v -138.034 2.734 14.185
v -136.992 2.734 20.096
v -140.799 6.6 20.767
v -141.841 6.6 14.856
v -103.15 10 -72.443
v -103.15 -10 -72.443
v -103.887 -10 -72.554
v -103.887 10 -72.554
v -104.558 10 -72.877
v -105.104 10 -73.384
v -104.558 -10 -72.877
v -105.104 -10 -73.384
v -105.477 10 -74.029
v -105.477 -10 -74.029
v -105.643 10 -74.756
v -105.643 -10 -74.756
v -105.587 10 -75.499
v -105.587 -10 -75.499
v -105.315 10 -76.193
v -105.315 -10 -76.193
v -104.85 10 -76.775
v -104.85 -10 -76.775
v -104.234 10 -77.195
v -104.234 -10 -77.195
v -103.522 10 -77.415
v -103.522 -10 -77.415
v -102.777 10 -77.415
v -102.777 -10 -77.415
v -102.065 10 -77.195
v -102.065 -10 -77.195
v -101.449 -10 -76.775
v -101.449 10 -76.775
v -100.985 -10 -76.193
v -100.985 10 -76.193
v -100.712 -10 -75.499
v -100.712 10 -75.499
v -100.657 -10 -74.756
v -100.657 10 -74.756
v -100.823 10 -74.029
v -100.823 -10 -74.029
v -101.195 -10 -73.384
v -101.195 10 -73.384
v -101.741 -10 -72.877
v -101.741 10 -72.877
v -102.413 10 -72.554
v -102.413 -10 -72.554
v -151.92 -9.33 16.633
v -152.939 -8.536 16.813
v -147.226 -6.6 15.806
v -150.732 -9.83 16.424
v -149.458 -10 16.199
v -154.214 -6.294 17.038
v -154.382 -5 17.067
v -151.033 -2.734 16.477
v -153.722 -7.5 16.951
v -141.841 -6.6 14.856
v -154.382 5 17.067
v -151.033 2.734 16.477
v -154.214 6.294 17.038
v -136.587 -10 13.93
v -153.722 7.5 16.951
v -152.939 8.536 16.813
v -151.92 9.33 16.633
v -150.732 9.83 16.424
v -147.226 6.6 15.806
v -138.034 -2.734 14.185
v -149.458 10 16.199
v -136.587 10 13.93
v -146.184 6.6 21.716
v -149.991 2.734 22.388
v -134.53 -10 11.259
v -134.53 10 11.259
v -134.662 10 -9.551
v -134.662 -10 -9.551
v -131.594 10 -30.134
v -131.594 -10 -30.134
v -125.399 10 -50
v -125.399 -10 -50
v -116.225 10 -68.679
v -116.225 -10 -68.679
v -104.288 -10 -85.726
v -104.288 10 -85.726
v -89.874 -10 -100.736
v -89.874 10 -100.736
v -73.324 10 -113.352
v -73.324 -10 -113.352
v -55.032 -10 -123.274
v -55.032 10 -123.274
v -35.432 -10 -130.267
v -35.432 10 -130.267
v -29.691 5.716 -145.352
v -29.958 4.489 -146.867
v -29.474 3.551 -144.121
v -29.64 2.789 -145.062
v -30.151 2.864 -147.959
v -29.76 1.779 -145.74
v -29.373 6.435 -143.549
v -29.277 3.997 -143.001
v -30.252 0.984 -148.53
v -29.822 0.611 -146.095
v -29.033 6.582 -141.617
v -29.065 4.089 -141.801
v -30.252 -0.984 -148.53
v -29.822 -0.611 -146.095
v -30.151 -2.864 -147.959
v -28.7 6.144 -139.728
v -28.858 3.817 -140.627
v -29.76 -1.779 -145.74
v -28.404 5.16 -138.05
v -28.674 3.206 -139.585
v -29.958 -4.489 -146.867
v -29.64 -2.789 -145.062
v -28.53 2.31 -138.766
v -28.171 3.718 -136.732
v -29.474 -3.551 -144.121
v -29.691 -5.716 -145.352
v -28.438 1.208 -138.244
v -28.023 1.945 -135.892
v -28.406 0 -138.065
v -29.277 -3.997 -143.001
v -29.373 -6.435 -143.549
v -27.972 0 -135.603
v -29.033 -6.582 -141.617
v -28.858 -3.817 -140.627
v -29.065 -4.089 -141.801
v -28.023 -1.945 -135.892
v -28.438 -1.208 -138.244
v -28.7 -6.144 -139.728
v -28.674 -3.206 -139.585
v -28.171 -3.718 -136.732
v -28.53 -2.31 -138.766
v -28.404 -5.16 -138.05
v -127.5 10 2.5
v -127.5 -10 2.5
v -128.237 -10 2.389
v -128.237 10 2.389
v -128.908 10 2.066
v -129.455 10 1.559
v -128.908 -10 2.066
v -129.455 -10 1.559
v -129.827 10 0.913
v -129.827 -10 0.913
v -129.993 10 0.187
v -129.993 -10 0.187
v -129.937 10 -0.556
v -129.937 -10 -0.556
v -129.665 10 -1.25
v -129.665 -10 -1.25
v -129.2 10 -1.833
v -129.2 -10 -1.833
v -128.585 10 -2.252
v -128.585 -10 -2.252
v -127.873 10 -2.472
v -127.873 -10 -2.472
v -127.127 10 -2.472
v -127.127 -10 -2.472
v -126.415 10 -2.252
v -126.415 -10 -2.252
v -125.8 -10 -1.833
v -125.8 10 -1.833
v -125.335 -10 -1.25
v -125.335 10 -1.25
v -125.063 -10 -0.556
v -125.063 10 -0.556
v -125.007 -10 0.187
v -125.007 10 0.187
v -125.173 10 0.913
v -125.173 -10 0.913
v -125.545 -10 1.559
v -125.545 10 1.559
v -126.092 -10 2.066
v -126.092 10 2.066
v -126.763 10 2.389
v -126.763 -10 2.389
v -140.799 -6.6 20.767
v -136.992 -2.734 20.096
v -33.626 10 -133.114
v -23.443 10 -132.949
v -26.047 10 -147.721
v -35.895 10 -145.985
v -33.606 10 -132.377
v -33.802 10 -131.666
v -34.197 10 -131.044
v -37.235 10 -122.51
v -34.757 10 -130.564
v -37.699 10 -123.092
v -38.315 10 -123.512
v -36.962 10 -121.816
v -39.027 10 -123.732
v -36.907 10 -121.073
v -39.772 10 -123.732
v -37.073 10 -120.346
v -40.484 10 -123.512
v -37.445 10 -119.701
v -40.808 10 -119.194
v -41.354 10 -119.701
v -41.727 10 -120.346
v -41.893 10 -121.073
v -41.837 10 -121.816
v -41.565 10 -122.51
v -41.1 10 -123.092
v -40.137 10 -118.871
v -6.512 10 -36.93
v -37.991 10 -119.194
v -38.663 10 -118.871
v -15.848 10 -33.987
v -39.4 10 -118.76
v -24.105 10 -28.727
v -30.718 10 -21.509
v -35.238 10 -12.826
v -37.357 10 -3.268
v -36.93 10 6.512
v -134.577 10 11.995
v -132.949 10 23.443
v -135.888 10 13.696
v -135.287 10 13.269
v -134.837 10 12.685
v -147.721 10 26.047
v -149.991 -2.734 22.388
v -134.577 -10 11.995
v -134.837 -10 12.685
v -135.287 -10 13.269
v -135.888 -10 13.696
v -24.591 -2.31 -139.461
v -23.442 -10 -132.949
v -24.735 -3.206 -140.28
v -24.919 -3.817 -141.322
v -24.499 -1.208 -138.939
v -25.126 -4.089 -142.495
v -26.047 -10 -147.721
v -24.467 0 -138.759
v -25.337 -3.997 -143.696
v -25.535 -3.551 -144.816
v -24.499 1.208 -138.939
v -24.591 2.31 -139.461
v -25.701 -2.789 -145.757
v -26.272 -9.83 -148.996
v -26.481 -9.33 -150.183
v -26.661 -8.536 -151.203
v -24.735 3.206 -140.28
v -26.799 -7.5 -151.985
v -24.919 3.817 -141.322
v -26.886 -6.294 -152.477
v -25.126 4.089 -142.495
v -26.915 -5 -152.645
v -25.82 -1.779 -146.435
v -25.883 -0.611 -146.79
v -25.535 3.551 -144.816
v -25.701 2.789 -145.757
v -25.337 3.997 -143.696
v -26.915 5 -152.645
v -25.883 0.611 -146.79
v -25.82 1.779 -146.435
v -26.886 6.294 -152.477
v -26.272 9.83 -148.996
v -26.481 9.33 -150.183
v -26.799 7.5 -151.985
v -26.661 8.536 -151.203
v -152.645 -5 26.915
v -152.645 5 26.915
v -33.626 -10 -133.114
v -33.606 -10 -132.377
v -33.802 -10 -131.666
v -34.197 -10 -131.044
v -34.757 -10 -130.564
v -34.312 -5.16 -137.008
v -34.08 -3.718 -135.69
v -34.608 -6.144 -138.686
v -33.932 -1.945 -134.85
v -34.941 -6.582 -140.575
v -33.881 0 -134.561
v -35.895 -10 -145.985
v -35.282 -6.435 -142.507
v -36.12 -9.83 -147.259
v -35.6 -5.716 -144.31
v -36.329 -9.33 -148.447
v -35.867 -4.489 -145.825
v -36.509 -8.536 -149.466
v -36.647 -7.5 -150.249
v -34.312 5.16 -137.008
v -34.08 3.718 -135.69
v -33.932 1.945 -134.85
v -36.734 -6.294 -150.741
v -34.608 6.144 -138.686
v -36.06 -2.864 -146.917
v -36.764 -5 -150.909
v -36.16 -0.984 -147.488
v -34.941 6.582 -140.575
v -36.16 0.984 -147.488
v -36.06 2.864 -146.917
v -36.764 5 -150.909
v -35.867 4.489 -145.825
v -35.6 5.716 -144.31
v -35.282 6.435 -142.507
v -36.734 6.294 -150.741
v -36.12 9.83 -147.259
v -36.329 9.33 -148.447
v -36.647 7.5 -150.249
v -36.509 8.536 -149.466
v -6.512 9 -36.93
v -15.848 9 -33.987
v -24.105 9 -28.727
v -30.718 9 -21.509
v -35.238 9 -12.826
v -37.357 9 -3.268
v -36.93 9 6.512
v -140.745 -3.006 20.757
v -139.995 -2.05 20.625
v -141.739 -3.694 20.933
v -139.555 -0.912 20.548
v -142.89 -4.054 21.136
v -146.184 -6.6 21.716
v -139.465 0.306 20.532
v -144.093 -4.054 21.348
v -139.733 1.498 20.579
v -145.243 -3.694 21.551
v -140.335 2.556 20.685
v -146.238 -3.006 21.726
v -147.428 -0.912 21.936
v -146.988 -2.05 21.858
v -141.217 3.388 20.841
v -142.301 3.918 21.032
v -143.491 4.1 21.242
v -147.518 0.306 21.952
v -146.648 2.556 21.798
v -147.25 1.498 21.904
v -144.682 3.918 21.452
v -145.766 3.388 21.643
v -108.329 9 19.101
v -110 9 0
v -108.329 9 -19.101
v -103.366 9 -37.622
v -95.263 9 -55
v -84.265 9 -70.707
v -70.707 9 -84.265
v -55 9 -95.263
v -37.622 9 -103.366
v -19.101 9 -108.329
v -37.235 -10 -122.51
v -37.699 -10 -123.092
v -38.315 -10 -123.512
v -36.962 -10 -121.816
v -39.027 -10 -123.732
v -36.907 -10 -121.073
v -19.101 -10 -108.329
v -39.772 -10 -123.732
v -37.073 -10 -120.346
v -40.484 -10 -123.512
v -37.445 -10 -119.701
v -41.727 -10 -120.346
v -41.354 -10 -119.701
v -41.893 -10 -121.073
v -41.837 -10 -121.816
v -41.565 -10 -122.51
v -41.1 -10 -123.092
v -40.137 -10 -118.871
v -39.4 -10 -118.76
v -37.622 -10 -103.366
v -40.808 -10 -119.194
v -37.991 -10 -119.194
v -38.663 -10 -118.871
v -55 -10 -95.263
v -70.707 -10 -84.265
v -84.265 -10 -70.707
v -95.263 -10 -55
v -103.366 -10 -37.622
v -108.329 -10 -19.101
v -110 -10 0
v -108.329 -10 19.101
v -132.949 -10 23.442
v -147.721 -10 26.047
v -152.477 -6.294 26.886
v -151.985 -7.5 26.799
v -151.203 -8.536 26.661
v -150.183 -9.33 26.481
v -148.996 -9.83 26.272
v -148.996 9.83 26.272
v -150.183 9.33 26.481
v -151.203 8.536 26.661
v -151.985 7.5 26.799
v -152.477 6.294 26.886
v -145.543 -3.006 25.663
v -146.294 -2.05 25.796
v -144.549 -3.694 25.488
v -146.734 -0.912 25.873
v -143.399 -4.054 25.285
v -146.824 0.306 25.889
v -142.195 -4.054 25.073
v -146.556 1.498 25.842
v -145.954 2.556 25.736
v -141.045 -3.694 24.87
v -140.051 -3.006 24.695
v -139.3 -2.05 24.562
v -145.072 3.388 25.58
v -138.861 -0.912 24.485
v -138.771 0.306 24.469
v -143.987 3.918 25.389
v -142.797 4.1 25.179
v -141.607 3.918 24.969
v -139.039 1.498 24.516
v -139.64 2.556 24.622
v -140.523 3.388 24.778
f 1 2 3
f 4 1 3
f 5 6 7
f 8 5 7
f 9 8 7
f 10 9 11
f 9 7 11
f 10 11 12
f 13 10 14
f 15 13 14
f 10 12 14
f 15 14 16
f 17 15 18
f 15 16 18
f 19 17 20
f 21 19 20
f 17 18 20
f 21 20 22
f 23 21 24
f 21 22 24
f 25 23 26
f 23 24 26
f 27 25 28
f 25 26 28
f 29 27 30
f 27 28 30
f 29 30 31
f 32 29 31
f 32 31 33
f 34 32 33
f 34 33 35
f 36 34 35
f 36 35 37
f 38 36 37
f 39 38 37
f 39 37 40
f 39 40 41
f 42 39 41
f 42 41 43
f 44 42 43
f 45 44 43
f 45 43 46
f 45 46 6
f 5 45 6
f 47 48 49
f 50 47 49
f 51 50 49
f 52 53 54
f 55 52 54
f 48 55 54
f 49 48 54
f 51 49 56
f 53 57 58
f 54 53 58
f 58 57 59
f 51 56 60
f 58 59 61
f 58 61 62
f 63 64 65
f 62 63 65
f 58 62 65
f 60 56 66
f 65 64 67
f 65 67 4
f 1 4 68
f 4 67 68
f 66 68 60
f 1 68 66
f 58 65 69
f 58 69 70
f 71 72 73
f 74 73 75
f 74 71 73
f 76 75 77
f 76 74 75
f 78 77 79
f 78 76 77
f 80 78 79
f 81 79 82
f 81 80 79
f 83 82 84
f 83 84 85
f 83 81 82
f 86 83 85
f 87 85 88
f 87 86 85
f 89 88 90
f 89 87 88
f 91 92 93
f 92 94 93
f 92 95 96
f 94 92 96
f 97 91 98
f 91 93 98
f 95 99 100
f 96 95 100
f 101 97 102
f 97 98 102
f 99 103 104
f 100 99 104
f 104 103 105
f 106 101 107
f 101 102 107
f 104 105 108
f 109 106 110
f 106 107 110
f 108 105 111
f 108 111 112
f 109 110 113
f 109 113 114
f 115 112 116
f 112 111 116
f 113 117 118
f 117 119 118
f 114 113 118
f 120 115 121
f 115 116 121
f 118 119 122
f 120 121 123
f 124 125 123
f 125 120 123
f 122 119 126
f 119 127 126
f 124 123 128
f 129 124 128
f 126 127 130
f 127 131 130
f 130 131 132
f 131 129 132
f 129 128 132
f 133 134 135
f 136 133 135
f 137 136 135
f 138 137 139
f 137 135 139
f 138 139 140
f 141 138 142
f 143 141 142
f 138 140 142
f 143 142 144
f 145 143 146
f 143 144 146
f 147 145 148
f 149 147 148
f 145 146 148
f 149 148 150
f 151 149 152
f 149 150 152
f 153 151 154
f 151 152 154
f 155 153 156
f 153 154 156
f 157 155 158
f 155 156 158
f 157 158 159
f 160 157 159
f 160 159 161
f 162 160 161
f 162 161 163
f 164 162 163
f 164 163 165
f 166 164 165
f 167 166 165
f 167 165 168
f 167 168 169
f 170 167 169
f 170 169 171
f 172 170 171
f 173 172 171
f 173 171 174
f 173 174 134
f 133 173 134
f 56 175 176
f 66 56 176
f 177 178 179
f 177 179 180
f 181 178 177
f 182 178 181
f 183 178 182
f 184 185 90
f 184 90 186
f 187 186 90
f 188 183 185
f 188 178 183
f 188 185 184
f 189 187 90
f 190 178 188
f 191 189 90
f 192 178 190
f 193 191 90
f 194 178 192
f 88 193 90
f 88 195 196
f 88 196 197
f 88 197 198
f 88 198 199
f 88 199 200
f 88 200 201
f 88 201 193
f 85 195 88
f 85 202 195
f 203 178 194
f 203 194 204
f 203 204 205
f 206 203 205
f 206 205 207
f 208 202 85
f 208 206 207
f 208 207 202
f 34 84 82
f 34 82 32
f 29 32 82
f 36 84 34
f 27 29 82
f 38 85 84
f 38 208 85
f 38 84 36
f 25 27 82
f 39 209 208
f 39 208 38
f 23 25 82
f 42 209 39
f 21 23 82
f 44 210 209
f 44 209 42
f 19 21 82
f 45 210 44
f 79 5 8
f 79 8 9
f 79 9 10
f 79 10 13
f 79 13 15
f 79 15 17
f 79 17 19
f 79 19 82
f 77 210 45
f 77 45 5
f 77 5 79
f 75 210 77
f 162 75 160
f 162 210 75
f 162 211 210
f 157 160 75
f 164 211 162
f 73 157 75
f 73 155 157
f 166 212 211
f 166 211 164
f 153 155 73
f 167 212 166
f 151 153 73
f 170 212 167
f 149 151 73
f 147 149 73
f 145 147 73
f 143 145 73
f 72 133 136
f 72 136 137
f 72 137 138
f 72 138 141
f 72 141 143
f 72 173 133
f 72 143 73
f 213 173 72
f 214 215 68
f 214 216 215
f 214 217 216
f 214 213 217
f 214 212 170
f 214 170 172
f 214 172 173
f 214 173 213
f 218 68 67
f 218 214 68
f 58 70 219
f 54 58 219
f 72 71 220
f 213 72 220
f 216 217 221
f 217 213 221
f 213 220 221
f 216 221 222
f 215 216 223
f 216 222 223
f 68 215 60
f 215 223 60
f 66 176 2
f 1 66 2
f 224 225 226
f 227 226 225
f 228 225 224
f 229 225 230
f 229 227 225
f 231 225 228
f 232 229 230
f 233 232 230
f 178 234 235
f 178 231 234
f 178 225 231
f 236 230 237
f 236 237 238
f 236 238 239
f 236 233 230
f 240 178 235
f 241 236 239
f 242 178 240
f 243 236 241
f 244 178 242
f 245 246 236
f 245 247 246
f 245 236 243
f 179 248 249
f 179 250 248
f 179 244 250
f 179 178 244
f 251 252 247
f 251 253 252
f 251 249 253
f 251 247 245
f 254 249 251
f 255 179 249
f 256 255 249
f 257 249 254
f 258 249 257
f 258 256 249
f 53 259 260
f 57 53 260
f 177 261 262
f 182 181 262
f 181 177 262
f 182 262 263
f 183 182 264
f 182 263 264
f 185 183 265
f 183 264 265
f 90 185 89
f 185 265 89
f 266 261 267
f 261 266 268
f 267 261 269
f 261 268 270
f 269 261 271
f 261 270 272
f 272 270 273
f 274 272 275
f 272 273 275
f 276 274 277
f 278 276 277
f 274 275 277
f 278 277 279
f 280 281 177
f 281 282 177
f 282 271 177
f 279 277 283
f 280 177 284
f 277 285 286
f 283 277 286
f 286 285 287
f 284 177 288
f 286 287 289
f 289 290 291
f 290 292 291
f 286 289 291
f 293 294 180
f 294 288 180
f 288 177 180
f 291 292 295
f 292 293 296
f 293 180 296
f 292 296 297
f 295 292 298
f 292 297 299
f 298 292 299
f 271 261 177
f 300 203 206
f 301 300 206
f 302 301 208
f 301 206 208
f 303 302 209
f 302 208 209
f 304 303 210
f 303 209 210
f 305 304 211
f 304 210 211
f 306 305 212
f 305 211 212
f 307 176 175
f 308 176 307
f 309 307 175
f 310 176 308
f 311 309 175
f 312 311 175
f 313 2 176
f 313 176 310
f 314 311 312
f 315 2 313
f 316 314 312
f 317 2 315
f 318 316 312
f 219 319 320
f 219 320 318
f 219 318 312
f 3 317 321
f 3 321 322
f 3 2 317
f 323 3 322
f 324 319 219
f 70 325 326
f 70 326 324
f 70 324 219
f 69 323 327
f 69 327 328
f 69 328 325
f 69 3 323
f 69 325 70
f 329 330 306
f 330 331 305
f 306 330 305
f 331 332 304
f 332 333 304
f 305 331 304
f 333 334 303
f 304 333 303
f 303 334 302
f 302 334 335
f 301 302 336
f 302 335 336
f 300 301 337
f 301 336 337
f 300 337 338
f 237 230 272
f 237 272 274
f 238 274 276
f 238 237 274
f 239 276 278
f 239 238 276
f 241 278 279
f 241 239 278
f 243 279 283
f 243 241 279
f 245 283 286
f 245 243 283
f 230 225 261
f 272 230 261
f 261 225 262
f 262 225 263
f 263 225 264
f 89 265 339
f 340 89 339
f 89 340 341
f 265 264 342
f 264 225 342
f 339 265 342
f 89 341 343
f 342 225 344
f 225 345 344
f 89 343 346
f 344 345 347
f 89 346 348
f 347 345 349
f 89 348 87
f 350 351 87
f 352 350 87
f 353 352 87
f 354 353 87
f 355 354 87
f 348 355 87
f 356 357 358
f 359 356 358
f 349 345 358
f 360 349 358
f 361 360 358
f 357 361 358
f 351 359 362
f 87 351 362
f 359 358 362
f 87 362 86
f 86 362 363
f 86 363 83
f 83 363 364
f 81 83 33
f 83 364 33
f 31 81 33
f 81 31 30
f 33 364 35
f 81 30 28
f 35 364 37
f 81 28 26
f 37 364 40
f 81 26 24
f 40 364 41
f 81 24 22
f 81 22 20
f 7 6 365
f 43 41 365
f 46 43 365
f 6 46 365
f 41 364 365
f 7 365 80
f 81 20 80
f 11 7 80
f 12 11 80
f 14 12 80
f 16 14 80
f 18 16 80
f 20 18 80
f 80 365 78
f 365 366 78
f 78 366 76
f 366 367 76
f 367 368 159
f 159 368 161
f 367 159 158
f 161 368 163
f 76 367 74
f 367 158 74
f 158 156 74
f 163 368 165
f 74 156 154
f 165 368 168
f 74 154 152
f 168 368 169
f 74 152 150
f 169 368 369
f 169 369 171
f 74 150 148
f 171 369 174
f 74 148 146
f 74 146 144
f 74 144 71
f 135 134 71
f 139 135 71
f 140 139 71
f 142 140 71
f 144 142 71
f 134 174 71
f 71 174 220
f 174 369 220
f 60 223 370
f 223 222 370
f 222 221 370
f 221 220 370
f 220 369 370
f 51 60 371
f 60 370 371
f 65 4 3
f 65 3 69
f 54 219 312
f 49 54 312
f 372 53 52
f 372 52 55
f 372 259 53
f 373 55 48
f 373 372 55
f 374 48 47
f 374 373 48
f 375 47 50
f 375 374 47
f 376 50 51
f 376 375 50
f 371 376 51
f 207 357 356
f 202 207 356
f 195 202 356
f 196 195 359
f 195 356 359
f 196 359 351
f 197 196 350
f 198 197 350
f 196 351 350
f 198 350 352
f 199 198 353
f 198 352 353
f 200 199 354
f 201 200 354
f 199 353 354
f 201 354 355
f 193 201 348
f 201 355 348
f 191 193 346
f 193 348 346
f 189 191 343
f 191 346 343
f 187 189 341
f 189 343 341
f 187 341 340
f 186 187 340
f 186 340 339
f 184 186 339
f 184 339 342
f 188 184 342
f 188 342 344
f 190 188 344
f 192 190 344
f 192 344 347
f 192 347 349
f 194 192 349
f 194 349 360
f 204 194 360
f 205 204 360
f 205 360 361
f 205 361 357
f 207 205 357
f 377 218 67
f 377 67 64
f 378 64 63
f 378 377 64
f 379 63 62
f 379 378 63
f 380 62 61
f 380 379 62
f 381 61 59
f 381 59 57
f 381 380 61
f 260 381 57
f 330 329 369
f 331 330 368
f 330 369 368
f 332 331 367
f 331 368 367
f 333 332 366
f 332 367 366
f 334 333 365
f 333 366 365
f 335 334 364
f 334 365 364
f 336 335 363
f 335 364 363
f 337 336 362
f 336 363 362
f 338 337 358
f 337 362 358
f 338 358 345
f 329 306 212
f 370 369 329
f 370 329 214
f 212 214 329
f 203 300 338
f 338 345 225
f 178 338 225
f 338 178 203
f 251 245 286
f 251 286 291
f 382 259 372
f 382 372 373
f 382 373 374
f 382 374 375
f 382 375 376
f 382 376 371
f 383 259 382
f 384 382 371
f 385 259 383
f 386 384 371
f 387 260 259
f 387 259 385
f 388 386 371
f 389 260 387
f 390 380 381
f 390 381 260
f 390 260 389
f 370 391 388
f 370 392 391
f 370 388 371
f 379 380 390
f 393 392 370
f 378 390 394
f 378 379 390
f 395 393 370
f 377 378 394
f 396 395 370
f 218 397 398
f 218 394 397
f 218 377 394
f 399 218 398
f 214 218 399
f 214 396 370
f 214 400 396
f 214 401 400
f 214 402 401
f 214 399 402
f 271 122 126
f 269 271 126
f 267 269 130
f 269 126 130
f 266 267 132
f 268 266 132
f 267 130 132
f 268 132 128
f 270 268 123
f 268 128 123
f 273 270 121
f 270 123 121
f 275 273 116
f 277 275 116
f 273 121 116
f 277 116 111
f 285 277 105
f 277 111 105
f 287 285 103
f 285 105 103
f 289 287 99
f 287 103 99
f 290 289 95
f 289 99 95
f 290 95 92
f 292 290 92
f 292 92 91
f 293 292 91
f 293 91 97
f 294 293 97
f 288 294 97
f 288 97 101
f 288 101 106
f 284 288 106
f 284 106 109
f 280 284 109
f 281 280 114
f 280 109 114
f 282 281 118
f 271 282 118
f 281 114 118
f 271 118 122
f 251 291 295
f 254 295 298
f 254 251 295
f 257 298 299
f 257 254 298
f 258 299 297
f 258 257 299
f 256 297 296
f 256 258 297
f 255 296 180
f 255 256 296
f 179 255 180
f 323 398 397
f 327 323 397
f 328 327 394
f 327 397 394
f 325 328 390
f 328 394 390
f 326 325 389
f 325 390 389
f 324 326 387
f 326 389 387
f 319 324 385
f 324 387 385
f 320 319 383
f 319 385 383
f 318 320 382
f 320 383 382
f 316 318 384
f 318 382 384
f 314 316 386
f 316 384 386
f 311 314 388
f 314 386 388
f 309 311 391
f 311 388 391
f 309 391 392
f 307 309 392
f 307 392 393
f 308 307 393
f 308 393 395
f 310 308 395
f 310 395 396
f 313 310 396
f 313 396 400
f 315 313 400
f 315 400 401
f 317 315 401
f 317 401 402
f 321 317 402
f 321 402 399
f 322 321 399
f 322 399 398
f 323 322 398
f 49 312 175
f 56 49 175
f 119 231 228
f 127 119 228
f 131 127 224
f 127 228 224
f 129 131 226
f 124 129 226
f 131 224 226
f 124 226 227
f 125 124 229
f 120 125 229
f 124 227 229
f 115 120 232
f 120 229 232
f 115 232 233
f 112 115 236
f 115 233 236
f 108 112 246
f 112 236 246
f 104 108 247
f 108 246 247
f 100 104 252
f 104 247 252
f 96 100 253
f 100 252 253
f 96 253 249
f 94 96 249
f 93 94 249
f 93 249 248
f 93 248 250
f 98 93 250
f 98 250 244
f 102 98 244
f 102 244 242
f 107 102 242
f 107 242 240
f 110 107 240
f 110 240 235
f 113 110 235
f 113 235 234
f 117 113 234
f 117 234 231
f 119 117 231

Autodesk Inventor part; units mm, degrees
ref_plane "YZ Plane" through (0, 0, 0) normal (1, 0, 0) x (0, 1, 0)
ref_plane "XZ Plane" through (0, 0, 0) normal (0, 1, 0) x (-1, 0, 0)
ref_plane "XY Plane" through (0, 0, 0) normal (0, 0, 1) x (1, 0, 0)
sketch "Sketch1" plane through (0, 0, 0) normal (0, 1, 0) x (-1, 0, 0)
  circle A0 centre (0, 0) radius 135
  circle A1 centre (0, 0) radius 110
  dimension "d0" = 270
  dimension "d1" = 220
extrude "Extrusion1" add sketch "Sketch1" along normal mid plane 20
sketch "Sketch2" plane through (0, 10, 0) normal (0, 1, 0) x (1, 0, 0)
  circle A0 centre (0, 0) radius 37.5
  circle A1 centre (0, 0) radius 135
  dimension "d4" = 75
  dimension "d20" = 270
extrude "Extrusion2" add sketch "Sketch2" against normal blind 1
sketch "Sketch3" plane through (0, 10, 0) normal (0, 1, 0) x (1, 0, 0)
  circle A0 centre (0, 0) radius 127.5
  circle A1 centre (127.5, 0) radius 2.5
  circle A2 centre (103.1497, 74.9426) radius 2.5
  circle A3 centre (39.3997, 121.2597) radius 2.5
  circle A4 centre (-39.3997, 121.2597) radius 2.5
  circle A5 centre (-103.1497, 74.9426) radius 2.5
  circle A6 centre (-127.5, 0) radius 2.5
  circle A7 centre (-103.1497, -74.9426) radius 2.5
  circle A8 centre (-39.3997, -121.2597) radius 2.5
  circle A9 centre (39.3997, -121.2597) radius 2.5
  circle A10 centre (103.1497, -74.9426) radius 2.5
  dimension "d7" = 255
  dimension "d8" = 5
  dimension "d11" = 360
hole "Hole1" at (127.5, 10, 0) at (103.1497, 10, 74.9426) at (39.3997, 10, 121.2597) at (-39.3997, 10, 121.2597) at (-103.1497, 10, 74.9426) at (-127.5, 10, 0) at (-103.1497, 10, -74.9426) at (-39.3997, 10, -121.2597) at (39.3997, 10, -121.2597) at (103.1497, 10, -74.9426) direction (0, -1, 0) diameter 5 end through all
sketch "Sketch4" plane through (0, -10, 0) normal (0, -1, 0) x (1, 0, 0)
  circle A0 centre (0, 0) radius 135
  line L0 (0, 0) -> (132.949, -23.4425)
  line L1 (0, 0) -> (135, 0) construction
  line L2 (0, 0) -> (-23.4425, -132.949)
  circle A1 centre (0, 0) radius 135 projected
  line L3 (0, 0) -> (135, 0) construction
  line L4 (0, 0) -> (-132.949, 23.4425)
  dimension "d21" = 135
  dimension "d22" = 10
  dimension "d23" = 100
extrude "Extrusion3" cut sketch "Sketch4" against normal through all contours A0 L0 L4 | A0 L2 L0
sketch "Sketch5" plane through (-23.4425, -10, -132.949) normal (0.9848, 0, -0.1736) x (-0.1736, 0, -0.9848)
  line L0 (0, 0) -> (-25, 0) projected
  line L1 (-2.5, 0) -> (15, 0)
  line L2 (20, 5) -> (20, 15)
  line L3 (15, 20) -> (-2.5, 20)
  line L4 (-2.5, 20) -> (-2.5, 0)
  line L5 (0, 20) -> (0, 0) projected
  arc A0 (20, 15) -> (15, 20) centre (15, 15) ccw
  arc A1 (15, 0) -> (20, 5) centre (15, 5) ccw
  point P0 (-135, 10)
  point P1 (20, 20)
  point P2 (20, 0)
  point P3 (0, 0)
  dimension "d26" = 22.5
  dimension "d27" = 20
  dimension "d28" = 20
  dimension "d29" = 5
extrude "Extrusion4" add sketch "Sketch5" against normal blind 10
fillet "Fillet1" radius 2.5 1 edges at (-33.2262, 0, -130.8473)
sketch "Sketch6" plane through (-132.949, -10, 23.4425) normal (0.1736, 0, 0.9848) x (0.9848, 0, -0.1736)
  line L0 (25, 0) -> (0, 0) projected
  line L1 (2.5, 0) -> (-15, 0)
  line L2 (-20, 5) -> (-20, 15)
  line L3 (-15, 20) -> (2.5, 20)
  line L4 (2.5, 20) -> (2.5, 0)
  line L5 (0, 0) -> (0, 20) projected
  arc A0 (-15, 20) -> (-20, 15) centre (-15, 15) ccw
  arc A1 (-20, 5) -> (-15, 0) centre (-15, 5) ccw
  point P0 (135, 10)
  point P1 (-20, 20)
  point P2 (-20, 0)
  point P3 (0, 0)
  dimension "d33" = 22.5
  dimension "d34" = 20
  dimension "d35" = 20
  dimension "d36" = 5
extrude "Extrusion5" add sketch "Sketch6" against normal blind 10
fillet "Fillet2" radius 2.5 1 edges at (-134.3203, 0, 13.53)
sketch "Sketch7" plane through (-33.2906, -10, -131.2126) normal (-0.9848, 0, 0.1736) x (0.1736, 0, 0.9848)
  line L0 (-1.9306, 20) -> (-15, 20) projected
  line L1 (-20, 15) -> (-20, 5) projected
  point P0 (135, 10)
  point P1 (-10, 10)
  dimension "d40" = 10
  dimension "d41" = 10
hole "Hole2" at (-35.0271, 0, -141.0606) direction (0.9848, 0, -0.1736) diameter 8.2 end through all counterbore diameter 13.2 counterbore depth 6
sketch "Sketch8" plane through (-134.6855, -10, 13.5944) normal (-0.1736, 0, -0.9848) x (-0.9848, 0, 0.1736)
  line L0 (12.7338, 3.4) -> (7.2662, 3.4)
  line L1 (7.2662, 3.4) -> (3.4, 7.2662)
  line L2 (3.4, 7.2662) -> (3.4, 12.7338)
  line L3 (3.4, 12.7338) -> (7.2662, 16.6)
  line L4 (7.2662, 16.6) -> (12.7338, 16.6)
  line L5 (12.7338, 16.6) -> (16.6, 12.7338)
  line L6 (16.6, 12.7338) -> (16.6, 7.2662)
  line L7 (16.6, 7.2662) -> (12.7338, 3.4)
  line L8 (1.9306, 0) -> (15, 0) projected
  line L9 (20, 5) -> (20, 15) projected
  point P0 (-135, 10)
  point P1 (10, 10)
  dimension "d49" = 10
  dimension "d50" = 10
  dimension "d51" = 13.2
extrude "Extrusion6" cut sketch "Sketch8" against normal blind 6
sketch "Sketch9" plane through (-133.6436, -10, 19.5033) normal (-0.1736, 0, -0.9848) x (-0.9848, 0, 0.1736)
  line L0 (1.9306, 0) -> (15, 0) projected
  line L1 (20, 5) -> (20, 15) projected
  point P0 (-135, 10)
  point P1 (10, 10)
  dimension "d54" = 10
  dimension "d55" = 10
hole "Hole3" at (-143.4917, 0, 21.2398) direction (0.1736, 0, 0.9848) diameter 8.2 end through all
properties part number "Cylinder Spacer 25mm_Q1+3"
